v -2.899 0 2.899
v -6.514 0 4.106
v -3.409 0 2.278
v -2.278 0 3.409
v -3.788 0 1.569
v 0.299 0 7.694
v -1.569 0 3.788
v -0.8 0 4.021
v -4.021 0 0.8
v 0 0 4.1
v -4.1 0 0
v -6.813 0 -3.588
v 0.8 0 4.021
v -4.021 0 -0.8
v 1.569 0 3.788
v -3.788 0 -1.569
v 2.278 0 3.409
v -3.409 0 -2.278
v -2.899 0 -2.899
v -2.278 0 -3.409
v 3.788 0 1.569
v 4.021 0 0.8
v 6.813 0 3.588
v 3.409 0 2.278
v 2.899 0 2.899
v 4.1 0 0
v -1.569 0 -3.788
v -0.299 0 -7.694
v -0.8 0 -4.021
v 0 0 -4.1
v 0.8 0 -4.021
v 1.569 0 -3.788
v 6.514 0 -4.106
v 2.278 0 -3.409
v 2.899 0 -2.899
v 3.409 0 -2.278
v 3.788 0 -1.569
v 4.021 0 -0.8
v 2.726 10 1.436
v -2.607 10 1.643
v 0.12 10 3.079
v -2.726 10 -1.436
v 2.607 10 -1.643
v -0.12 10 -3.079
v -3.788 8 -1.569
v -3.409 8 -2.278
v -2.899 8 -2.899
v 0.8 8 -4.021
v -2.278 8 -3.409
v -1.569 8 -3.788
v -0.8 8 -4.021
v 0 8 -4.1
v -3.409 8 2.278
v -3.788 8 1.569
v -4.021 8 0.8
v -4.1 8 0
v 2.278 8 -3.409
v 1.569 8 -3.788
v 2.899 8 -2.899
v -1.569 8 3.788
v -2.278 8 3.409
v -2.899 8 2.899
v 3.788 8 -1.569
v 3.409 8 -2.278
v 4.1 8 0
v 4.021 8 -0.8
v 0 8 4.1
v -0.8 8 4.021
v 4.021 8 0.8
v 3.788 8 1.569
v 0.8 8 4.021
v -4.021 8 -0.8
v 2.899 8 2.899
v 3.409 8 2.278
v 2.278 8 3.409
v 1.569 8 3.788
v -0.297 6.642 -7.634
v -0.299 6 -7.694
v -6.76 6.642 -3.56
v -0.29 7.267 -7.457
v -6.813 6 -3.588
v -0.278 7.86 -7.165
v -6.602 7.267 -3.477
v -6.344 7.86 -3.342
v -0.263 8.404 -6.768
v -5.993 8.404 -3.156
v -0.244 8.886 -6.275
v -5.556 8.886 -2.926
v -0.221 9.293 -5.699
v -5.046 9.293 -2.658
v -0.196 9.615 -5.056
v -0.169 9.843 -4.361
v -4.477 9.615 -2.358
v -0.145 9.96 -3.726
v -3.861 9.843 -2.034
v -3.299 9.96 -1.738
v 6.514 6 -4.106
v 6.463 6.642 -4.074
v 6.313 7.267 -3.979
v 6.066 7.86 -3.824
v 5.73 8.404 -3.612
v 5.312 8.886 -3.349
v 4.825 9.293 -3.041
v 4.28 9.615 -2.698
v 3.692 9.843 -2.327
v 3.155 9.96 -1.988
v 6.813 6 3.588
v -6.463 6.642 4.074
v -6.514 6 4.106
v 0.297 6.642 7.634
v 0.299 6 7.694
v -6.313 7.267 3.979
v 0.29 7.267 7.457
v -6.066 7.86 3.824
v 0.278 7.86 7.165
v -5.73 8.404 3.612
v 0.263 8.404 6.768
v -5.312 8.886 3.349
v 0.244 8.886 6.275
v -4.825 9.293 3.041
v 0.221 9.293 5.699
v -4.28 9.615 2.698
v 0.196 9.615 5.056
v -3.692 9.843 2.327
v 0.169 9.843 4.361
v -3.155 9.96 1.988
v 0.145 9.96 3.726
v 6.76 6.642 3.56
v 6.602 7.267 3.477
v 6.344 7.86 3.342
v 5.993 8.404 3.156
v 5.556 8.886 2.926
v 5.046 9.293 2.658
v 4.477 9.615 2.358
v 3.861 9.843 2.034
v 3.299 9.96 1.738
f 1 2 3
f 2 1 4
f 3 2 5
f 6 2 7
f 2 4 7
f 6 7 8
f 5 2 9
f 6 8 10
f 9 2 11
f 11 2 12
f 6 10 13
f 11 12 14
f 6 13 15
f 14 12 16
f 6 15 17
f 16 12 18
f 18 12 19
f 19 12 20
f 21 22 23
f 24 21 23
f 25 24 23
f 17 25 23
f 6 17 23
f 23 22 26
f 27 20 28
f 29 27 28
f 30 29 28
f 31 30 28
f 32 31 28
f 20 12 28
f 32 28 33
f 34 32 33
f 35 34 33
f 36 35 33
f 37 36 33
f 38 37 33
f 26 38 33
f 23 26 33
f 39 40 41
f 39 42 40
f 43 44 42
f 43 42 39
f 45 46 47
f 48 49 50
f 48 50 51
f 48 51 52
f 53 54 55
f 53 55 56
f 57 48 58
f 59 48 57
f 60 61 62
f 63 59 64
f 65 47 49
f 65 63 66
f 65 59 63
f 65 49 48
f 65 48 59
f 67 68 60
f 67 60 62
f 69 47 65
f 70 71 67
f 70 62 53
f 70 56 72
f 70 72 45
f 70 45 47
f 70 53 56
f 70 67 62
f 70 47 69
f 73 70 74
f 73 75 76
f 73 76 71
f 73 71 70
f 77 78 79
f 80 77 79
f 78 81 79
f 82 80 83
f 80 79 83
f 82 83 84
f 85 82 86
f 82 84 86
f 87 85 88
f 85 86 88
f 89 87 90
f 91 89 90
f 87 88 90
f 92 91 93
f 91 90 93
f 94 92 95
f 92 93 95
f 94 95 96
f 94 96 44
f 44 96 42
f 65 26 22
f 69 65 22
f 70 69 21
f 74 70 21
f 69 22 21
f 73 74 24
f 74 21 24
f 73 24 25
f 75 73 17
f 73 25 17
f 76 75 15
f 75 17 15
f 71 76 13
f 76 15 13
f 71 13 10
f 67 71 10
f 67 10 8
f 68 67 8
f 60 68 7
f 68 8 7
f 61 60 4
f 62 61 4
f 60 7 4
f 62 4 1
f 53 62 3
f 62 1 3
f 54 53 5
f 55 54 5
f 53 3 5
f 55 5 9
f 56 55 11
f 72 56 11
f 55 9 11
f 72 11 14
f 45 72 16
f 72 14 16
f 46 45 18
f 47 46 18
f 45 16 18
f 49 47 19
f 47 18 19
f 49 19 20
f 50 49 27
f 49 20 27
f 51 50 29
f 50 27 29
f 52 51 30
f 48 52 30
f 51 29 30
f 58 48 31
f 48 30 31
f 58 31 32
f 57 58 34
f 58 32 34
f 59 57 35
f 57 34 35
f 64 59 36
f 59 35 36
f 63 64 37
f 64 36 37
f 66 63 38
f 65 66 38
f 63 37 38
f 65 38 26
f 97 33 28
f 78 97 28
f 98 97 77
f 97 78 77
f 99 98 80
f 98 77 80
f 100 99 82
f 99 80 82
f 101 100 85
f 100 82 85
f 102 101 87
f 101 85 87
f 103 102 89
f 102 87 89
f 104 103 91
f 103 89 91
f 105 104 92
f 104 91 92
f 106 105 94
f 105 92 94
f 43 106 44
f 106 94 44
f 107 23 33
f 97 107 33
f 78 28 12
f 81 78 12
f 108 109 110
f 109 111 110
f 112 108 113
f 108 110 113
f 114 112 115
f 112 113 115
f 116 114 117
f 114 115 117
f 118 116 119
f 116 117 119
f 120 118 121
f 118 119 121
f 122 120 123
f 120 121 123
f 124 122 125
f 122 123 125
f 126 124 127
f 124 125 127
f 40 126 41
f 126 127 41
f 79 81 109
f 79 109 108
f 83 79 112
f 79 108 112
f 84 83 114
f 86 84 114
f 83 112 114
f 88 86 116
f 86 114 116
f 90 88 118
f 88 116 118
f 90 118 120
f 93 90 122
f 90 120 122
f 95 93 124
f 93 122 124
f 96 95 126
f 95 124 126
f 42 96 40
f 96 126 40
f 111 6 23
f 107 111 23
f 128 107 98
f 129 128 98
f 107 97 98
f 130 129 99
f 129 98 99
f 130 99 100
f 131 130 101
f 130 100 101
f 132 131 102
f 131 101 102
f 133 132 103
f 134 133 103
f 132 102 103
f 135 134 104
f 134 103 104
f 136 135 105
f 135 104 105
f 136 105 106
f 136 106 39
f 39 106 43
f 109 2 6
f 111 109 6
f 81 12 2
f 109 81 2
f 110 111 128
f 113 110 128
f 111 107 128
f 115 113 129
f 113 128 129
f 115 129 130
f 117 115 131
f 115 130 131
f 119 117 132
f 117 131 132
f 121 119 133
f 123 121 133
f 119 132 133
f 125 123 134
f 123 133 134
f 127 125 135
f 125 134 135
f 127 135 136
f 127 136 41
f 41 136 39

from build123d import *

# Parameters (mm, degrees)
BOSS_EXTRUDE1_DEPTH = 10
FILLET1_R           = 4
SKETCH2_R           = 4.1
CUT_EXTRUDE1_DEPTH  = 8


with BuildPart() as part:
    # Sketch1 → Boss-Extrude1 (new body)
    with BuildSketch(Plane(origin=(0, 0, 0), x_dir=(1, 0, 0), z_dir=(0, 1, 0))):
        Polygon((-6.812793916, 3.588291941), (-6.513948935, -4.105906632), (0.298844981, -7.694198573), (6.812793916, -3.588291941), (6.513948935, 4.105906632), (-0.298844981, 7.694198573), align=None)
    extrude(amount=BOSS_EXTRUDE1_DEPTH)

    # Fillet1
    fillet1_edges = [part.edges().sort_by_distance(p)[0] for p in [
        (-3.107551977, 10, 5.900052602),
        (3.555819448, 10, 5.641245257),
        (6.663371426, 10, -0.258807345),
        (3.107551977, 10, -5.900052602),
        (-3.555819448, 10, -5.641245257),
        (-6.663371426, 10, 0.258807345),
    ]]
    fillet(fillet1_edges, radius=FILLET1_R)

    # Sketch2 → Cut-Extrude1 (cut)
    with BuildSketch(Plane.XZ):
        Circle(SKETCH2_R)
    extrude(amount=-CUT_EXTRUDE1_DEPTH, mode=Mode.SUBTRACT)


solid = part.part
